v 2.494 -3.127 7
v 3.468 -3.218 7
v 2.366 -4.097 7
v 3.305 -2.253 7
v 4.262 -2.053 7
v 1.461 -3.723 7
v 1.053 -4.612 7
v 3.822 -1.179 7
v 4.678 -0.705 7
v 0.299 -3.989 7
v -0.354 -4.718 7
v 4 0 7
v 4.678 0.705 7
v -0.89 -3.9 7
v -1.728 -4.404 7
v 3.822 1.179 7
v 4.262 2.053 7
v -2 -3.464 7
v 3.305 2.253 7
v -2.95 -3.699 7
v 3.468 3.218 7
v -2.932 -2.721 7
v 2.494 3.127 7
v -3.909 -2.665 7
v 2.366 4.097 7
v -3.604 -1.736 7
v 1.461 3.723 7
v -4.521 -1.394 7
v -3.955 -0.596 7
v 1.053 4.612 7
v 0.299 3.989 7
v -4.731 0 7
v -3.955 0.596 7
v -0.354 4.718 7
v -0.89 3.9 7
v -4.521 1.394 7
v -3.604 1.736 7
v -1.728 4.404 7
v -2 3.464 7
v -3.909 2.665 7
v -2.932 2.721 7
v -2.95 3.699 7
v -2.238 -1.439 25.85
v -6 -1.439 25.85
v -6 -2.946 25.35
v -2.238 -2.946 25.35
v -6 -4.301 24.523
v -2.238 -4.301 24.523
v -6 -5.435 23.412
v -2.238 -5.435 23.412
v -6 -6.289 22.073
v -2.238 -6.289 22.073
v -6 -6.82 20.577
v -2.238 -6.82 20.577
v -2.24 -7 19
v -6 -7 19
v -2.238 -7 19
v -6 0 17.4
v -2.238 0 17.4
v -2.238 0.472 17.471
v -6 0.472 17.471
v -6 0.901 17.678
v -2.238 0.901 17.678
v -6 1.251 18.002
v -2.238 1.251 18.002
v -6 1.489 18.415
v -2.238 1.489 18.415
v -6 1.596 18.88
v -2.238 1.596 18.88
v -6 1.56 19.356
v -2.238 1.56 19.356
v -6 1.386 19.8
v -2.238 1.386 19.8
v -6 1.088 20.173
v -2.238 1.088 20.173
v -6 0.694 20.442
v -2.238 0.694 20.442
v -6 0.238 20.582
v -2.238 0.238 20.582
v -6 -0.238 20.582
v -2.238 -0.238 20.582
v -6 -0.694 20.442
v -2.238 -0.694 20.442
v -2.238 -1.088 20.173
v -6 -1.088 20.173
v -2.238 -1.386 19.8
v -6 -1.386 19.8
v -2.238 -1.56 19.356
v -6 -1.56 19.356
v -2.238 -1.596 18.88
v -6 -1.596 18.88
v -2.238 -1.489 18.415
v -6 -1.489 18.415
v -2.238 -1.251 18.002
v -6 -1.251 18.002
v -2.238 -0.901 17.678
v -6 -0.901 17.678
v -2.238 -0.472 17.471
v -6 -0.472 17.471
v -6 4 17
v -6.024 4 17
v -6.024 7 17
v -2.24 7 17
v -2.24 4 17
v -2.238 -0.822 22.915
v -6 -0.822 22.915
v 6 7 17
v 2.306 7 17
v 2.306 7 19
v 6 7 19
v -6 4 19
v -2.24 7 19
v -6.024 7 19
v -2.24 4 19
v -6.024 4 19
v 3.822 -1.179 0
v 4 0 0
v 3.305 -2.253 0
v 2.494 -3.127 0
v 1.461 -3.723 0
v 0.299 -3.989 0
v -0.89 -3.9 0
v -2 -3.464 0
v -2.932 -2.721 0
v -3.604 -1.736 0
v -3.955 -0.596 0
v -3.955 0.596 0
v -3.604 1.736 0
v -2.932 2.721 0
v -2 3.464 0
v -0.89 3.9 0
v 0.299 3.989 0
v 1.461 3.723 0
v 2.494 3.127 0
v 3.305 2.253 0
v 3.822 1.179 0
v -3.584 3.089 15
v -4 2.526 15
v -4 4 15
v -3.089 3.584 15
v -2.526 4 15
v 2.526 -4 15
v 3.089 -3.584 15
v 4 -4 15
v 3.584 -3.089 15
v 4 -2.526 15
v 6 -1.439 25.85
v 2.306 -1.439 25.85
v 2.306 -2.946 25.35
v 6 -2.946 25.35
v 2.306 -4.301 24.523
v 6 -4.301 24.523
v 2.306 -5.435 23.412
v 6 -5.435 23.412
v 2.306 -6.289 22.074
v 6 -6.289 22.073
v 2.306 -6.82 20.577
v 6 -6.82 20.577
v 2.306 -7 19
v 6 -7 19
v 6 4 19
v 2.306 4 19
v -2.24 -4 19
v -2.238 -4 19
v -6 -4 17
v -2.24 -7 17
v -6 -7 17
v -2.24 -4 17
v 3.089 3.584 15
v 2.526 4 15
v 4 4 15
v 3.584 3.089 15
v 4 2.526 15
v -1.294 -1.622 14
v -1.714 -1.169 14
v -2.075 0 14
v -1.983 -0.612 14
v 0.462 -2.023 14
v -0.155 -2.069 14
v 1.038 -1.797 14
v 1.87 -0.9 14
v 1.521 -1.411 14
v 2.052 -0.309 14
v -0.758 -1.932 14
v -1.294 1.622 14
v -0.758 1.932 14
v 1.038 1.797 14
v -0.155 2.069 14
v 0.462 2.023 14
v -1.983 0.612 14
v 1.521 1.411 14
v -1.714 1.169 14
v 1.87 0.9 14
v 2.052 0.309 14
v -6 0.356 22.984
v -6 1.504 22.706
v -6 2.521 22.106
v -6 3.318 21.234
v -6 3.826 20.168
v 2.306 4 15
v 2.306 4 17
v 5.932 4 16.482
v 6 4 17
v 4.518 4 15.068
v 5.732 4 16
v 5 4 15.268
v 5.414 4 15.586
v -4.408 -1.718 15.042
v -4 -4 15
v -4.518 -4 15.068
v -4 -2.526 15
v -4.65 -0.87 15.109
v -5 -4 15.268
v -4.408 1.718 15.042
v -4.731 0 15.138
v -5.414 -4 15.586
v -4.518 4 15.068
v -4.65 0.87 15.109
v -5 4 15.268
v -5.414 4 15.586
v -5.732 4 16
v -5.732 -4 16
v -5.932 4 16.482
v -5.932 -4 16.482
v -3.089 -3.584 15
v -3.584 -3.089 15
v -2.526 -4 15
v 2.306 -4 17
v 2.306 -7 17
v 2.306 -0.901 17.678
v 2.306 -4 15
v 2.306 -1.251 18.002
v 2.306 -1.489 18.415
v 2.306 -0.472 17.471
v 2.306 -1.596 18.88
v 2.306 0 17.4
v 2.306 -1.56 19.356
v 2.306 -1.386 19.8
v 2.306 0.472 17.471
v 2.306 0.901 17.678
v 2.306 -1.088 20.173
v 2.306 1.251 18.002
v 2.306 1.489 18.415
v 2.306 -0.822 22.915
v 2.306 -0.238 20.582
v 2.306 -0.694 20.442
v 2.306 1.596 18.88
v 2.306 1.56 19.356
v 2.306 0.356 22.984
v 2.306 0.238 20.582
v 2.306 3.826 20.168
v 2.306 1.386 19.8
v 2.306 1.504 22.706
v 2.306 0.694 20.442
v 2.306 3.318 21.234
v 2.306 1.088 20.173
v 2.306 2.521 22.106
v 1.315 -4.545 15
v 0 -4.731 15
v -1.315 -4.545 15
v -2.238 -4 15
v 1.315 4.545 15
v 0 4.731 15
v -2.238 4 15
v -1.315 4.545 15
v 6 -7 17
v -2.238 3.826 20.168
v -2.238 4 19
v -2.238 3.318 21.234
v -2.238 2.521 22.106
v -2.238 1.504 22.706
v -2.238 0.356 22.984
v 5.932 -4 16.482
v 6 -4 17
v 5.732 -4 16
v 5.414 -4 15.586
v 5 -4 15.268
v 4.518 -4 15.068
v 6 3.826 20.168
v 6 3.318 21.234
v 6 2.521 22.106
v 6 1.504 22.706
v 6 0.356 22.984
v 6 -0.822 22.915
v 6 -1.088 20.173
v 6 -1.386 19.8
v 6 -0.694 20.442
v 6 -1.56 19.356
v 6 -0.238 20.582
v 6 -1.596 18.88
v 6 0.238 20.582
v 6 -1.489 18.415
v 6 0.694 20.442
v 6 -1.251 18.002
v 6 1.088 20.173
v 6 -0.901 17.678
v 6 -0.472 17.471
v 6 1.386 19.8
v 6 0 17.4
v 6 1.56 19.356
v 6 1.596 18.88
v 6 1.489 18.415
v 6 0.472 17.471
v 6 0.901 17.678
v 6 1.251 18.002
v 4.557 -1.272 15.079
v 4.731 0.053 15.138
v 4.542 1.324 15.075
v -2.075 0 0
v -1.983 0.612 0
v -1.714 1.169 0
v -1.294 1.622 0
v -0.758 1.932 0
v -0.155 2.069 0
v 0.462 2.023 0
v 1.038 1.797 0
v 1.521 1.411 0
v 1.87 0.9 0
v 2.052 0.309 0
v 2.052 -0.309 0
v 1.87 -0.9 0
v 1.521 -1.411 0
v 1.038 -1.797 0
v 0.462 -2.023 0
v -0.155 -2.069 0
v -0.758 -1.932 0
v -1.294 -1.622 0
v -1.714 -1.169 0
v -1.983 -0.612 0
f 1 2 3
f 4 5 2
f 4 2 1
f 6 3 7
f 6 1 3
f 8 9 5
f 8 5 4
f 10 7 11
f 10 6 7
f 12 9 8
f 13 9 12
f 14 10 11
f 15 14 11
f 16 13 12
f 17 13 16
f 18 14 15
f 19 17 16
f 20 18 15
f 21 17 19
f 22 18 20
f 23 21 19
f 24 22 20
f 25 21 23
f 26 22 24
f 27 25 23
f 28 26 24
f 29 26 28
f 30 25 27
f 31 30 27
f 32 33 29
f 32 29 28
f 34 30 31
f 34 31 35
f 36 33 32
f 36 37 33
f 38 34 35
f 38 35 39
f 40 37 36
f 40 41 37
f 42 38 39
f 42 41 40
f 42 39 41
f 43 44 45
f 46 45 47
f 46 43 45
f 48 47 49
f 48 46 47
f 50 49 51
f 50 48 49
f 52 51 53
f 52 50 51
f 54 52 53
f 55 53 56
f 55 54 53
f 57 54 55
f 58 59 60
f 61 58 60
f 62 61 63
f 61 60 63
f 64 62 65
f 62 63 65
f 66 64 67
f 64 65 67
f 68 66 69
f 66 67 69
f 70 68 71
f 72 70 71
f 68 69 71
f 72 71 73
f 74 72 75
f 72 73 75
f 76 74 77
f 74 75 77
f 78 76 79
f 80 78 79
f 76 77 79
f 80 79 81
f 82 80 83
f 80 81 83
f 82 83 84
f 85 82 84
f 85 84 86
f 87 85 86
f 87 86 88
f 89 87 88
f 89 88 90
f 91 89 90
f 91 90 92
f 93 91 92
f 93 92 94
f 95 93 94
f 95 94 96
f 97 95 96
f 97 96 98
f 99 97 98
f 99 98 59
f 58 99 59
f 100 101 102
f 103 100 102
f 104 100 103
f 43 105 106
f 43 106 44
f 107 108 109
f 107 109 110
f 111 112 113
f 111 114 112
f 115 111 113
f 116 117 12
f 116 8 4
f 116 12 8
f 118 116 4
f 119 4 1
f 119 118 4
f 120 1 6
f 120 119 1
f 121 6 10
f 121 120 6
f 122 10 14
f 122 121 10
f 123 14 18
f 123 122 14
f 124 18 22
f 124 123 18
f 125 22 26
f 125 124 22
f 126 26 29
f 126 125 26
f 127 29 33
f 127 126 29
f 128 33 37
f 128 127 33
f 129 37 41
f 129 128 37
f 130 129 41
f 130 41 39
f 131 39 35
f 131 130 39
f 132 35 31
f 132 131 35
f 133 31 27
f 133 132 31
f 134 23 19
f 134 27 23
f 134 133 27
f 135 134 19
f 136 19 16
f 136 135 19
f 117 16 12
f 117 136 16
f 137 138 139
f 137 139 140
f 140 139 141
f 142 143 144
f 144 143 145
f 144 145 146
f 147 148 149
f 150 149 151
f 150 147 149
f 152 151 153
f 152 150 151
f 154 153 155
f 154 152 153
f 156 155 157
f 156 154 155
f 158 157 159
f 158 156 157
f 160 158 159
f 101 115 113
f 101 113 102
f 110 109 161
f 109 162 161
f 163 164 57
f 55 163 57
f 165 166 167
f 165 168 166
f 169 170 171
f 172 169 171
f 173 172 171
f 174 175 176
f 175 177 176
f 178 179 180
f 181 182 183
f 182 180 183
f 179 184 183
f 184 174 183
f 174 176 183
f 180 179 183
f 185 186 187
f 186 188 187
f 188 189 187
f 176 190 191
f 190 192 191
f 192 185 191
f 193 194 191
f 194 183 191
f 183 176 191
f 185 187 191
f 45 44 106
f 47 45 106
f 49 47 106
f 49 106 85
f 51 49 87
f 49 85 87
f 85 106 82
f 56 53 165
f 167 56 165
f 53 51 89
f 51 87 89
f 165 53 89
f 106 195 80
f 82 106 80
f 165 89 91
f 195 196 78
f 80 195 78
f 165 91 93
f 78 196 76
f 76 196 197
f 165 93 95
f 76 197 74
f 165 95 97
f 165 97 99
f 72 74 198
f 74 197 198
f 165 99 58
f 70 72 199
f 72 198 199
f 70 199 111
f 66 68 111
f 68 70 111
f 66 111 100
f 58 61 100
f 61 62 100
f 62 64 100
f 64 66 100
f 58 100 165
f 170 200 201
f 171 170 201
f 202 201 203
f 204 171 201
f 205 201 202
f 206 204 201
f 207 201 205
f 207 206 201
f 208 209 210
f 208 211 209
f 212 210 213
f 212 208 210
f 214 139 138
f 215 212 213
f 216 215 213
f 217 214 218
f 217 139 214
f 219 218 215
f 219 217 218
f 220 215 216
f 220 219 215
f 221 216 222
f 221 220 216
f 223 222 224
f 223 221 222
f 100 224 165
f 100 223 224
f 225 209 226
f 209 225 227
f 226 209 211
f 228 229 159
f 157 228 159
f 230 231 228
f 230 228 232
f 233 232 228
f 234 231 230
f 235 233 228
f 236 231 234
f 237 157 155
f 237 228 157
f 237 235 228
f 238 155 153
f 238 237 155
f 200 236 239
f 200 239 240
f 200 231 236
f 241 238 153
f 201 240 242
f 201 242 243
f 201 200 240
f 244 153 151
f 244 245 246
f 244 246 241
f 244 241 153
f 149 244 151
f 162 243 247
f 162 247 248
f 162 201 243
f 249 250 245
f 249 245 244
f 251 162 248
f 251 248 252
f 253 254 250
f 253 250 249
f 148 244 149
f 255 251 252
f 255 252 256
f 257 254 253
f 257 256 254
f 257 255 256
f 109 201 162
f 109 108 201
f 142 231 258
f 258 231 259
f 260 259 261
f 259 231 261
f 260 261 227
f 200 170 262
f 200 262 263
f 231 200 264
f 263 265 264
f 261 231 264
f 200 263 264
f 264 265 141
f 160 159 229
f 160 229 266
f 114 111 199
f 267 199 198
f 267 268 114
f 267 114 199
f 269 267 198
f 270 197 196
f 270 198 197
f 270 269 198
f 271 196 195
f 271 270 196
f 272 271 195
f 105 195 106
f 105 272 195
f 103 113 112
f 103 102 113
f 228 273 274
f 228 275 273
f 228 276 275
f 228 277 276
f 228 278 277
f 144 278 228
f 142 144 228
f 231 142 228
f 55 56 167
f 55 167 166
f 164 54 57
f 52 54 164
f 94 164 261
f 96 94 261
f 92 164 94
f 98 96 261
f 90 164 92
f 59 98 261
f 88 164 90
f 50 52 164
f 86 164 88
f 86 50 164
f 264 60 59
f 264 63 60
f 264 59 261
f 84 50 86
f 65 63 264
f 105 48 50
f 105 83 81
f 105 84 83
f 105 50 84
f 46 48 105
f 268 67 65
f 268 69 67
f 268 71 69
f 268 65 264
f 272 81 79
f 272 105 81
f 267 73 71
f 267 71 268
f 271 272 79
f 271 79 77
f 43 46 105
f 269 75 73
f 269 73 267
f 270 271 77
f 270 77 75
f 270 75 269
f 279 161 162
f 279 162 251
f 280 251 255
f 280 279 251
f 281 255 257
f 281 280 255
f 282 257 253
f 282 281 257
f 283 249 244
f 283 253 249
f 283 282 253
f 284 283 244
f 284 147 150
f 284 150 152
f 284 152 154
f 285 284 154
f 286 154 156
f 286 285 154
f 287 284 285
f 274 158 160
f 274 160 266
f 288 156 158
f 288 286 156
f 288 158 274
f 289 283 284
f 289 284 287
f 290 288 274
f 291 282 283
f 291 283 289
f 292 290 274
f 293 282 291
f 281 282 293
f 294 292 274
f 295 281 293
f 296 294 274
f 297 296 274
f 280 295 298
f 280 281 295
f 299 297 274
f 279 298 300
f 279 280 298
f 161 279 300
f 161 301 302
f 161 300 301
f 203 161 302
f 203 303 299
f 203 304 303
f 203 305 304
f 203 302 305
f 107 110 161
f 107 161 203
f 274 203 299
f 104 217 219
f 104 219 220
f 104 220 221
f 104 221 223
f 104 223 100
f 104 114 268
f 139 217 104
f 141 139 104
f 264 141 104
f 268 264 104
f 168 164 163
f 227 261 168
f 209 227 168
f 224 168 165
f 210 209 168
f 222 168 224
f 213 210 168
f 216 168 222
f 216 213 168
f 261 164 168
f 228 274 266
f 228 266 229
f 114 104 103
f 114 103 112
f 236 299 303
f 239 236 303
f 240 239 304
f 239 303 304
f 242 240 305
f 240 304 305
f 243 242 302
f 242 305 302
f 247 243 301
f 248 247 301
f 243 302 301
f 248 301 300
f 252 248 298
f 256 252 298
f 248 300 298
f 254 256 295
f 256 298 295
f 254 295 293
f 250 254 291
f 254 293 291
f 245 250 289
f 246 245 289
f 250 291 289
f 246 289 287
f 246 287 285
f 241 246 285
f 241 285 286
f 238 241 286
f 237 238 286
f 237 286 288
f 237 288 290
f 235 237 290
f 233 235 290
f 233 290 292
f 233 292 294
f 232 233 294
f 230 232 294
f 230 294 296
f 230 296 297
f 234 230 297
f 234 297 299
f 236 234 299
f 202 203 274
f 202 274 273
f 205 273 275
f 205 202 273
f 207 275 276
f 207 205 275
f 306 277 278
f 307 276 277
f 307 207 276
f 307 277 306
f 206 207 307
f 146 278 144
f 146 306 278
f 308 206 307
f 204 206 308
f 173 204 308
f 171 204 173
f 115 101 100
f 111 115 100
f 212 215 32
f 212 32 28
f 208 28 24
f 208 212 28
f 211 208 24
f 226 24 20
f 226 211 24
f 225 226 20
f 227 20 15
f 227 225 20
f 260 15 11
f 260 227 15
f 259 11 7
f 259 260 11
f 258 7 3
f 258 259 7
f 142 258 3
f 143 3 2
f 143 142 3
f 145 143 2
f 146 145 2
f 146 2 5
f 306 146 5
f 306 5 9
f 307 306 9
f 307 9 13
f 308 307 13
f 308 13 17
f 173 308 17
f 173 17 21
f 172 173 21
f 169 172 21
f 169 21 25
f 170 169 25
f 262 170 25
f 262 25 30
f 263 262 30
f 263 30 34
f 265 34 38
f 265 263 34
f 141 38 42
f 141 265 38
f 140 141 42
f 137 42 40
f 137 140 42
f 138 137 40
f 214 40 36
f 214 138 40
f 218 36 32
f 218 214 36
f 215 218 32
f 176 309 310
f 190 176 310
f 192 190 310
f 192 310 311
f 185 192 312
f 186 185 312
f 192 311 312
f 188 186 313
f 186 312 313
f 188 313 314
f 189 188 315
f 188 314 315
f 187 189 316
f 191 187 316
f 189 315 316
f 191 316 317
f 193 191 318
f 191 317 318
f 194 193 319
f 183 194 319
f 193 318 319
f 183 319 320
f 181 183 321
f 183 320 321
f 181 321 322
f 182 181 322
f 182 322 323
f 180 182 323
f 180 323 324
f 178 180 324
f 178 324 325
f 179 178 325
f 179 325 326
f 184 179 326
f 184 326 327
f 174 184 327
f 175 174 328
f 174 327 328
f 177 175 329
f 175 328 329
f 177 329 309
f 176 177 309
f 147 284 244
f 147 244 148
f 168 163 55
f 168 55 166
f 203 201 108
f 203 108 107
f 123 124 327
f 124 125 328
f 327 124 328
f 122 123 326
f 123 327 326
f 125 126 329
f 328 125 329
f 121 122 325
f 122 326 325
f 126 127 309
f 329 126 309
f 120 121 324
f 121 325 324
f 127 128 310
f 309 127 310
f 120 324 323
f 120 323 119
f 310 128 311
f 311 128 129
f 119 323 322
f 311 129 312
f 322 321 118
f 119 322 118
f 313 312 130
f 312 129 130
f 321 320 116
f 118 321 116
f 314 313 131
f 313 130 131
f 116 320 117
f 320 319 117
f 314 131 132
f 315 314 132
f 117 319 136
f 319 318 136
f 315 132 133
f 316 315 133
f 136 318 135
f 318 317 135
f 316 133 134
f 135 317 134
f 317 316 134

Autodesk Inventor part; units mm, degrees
ref_plane "YZ Plane" through (0, 0, 0) normal (1, 0, 0) x (0, 1, 0)
ref_plane "XZ Plane" through (0, 0, 0) normal (0, 1, 0) x (-1, 0, 0)
ref_plane "XY Plane" through (0, 0, 0) normal (0, 0, 1) x (1, 0, 0)
sketch "Sketch1" plane through (0, 0, 0) normal (0, 0, 1) x (1, 0, 0)
  circle A0 centre (0, 0) radius 2
  circle A1 centre (0, 0) radius 4
  dimension "d0" = 4
  dimension "d1" = 8
extrude "Extrusion1" add sketch "Sketch1" along normal blind 15
sketch "Sketch2" plane through (0, 0, 15) normal (0, 0, 1) x (1, 0, 0)
  circle A0 centre (0, 0) radius 4 projected
  line L0 (0, 4) -> (6, 4)
  line L1 (6, 4) -> (6, -4)
  line L2 (6, -4) -> (0, -4)
  line L3 (0, -4) -> (0, 4)
  line L4 (0, 4) -> (-6, 4)
  line L5 (-6, 4) -> (-6, -4)
  line L6 (-6, -4) -> (0, -4)
  line L7 (0, -4) -> (0, 4)
  dimension "d4" = 6
  dimension "d5" = 6
extrude "Extrusion2" add sketch "Sketch2" along normal blind 8
sketch "Sketch3" plane through (0, 0, 23) normal (0, 0, 1) x (1, 0, 0)
  line L0 (6, 4) -> (-6, 4) projected
  line L1 (-6, -4) -> (6, -4) projected
  line L2 (-2.2377, 4) -> (2.306, 4)
  line L3 (2.306, 4) -> (2.306, -4)
  line L4 (2.306, -4) -> (-2.2377, -4)
  line L5 (-2.2377, -4) -> (-2.2377, 4)
  point P0 (0, 0)
extrude "Extrusion3" cut sketch "Sketch3" against normal blind 8
sketch "Sketch4" plane through (0, 0, 15) normal (0, 0, -1) x (-1, 0, 0)
  circle A0 centre (0, 0) radius 4
  circle A1 centre (0, 0) radius 4.731
extrude "Extrusion4" add sketch "Sketch4" along normal blind 8
sketch "Sketch5" plane through (6, -4, 15) normal (1, 0, 0) x (0, 0, -1)
  line L0 (0, 8) -> (-8, 8) projected
  line L1 (0, 0) -> (-8, 0) projected
  line L2 (-8, 8) -> (0, 8)
  line L3 (0, 8) -> (0, 0)
  line L4 (0, 0) -> (-8, 0)
  line L5 (-8, 0) -> (-8, 8)
  circle A0 centre (-4, 4) radius 1.6
  circle A1 centre (-4, 4) radius 4
  point P0 (15, 4)
  point P1 (-8, 4)
  point P2 (-4, 8)
  point P3 (-4, 0)
  dimension "d12" = 3.2
extrude "Extrusion5" cut sketch "Sketch5" against normal blind 14 contours A1 L5 L0 | A1 L1 L5 | A0
fillet "Fillet1" radius 2 2 edges at (-6, 0, 15) (6, 0, 15)
sketch "Sketch7" plane through (2.306, 4, 15) normal (0, 1, 0) x (1, 0, 0)
  point P0 (-2.306, 15)
sketch "Sketch8" plane through (2.306, 4, 15) normal (0, 1, 0) x (1, 0, 0)
  line L0 (0, -4) -> (3.694, -4) projected
  line L1 (0, 0) -> (0, -4) projected
  line L2 (3.694, -4) -> (0, -4)
  line L3 (0, -4) -> (0, -2)
  line L4 (0, -2) -> (3.694, -2)
  line L5 (3.694, -2) -> (3.694, -4)
  line L6 (-4.5455, -4) -> (-8.3301, -4)
  line L7 (-8.3301, -4) -> (-8.3301, -2)
  line L8 (-8.3301, -2) -> (-4.5455, -2)
  line L9 (-4.5455, -2) -> (-4.5455, -4)
  point P0 (-2.306, 15)
extrude "Extrusion7" add sketch "Sketch8" along normal blind 3
sketch "Sketch9" plane through (-2.5263, -4, 15) normal (0, -1, 0) x (1, 0, 0)
  line L0 (-3.4737, 2) -> (-3.4737, 4) projected
  line L1 (0.2868, 2) -> (-3.4978, 2) projected
  line L2 (-3.4737, 4) -> (0.2868, 4)
  line L3 (0.2868, 4) -> (0.2868, 2)
  line L4 (0.2868, 2) -> (-3.4737, 2)
  line L5 (-3.4737, 2) -> (-3.4737, 4)
  line L6 (4.8006, 4) -> (8.5263, 4)
  line L7 (8.5263, 4) -> (8.5263, 2)
  line L8 (8.5263, 2) -> (4.8006, 2)
  line L9 (4.8006, 2) -> (4.8006, 4)
  point P0 (2.5263, -15)
extrude "Extrusion8" add sketch "Sketch9" along normal blind 3
sketch "Sketch10" plane through (6, 4, 17) normal (1, 0, 0) x (0, 0, -1)
  circle A0 centre (-1.9999, -4) radius 7
  circle A1 centre (-2, -4) radius 1.6 projected
  circle A2 centre (-2, -4) radius 4
  line L0 (-2, -8) -> (-1.9999, -11)
  line L1 (-2, -4) -> (-8.8503, -5.4392)
  point P0 (17, -4)
  point P1 (-5.9145, -4.8224)
  dimension "d24" = 14
extrude "Extrusion9" add sketch "Sketch10" against normal blind 12 contours L1 A2 L0 A0 picked at (-2.5257, -9.94)
sketch "Sketch11" plane through (-2.5263, -4, 15) normal (0, -1, 0) x (1, 0, 0)
  line L0 (0, 0) -> (0.2886, 0) projected
  line L1 (0.2886, 0) -> (4.8323, 0)
  line L2 (4.8323, 0) -> (4.8323, 13.1536)
  line L3 (4.8323, 13.1536) -> (0.2886, 13.1536)
  line L4 (0.2886, 13.1536) -> (0.2886, 0)
  point P0 (2.5263, -15)
extrude "Extrusion10" cut sketch "Sketch11" along normal mid plane 12
sketch "Sketch12" plane through (0, 0, 0) normal (0, 0, -1) x (-1, 0, 0)
  circle A0 centre (0, 0) radius 2.075
  dimension "d29" = 4.15
extrude "Extrusion11" cut sketch "Sketch12" against normal blind 20
sketch "Sketch13" plane through (0, 0, 15) normal (0, 0, 1) x (1, 0, 0)
  circle A0 centre (0, 0) radius 2.2168
extrude "Extrusion12" add sketch "Sketch13" against normal blind 1
properties part number "hingejoint2"
